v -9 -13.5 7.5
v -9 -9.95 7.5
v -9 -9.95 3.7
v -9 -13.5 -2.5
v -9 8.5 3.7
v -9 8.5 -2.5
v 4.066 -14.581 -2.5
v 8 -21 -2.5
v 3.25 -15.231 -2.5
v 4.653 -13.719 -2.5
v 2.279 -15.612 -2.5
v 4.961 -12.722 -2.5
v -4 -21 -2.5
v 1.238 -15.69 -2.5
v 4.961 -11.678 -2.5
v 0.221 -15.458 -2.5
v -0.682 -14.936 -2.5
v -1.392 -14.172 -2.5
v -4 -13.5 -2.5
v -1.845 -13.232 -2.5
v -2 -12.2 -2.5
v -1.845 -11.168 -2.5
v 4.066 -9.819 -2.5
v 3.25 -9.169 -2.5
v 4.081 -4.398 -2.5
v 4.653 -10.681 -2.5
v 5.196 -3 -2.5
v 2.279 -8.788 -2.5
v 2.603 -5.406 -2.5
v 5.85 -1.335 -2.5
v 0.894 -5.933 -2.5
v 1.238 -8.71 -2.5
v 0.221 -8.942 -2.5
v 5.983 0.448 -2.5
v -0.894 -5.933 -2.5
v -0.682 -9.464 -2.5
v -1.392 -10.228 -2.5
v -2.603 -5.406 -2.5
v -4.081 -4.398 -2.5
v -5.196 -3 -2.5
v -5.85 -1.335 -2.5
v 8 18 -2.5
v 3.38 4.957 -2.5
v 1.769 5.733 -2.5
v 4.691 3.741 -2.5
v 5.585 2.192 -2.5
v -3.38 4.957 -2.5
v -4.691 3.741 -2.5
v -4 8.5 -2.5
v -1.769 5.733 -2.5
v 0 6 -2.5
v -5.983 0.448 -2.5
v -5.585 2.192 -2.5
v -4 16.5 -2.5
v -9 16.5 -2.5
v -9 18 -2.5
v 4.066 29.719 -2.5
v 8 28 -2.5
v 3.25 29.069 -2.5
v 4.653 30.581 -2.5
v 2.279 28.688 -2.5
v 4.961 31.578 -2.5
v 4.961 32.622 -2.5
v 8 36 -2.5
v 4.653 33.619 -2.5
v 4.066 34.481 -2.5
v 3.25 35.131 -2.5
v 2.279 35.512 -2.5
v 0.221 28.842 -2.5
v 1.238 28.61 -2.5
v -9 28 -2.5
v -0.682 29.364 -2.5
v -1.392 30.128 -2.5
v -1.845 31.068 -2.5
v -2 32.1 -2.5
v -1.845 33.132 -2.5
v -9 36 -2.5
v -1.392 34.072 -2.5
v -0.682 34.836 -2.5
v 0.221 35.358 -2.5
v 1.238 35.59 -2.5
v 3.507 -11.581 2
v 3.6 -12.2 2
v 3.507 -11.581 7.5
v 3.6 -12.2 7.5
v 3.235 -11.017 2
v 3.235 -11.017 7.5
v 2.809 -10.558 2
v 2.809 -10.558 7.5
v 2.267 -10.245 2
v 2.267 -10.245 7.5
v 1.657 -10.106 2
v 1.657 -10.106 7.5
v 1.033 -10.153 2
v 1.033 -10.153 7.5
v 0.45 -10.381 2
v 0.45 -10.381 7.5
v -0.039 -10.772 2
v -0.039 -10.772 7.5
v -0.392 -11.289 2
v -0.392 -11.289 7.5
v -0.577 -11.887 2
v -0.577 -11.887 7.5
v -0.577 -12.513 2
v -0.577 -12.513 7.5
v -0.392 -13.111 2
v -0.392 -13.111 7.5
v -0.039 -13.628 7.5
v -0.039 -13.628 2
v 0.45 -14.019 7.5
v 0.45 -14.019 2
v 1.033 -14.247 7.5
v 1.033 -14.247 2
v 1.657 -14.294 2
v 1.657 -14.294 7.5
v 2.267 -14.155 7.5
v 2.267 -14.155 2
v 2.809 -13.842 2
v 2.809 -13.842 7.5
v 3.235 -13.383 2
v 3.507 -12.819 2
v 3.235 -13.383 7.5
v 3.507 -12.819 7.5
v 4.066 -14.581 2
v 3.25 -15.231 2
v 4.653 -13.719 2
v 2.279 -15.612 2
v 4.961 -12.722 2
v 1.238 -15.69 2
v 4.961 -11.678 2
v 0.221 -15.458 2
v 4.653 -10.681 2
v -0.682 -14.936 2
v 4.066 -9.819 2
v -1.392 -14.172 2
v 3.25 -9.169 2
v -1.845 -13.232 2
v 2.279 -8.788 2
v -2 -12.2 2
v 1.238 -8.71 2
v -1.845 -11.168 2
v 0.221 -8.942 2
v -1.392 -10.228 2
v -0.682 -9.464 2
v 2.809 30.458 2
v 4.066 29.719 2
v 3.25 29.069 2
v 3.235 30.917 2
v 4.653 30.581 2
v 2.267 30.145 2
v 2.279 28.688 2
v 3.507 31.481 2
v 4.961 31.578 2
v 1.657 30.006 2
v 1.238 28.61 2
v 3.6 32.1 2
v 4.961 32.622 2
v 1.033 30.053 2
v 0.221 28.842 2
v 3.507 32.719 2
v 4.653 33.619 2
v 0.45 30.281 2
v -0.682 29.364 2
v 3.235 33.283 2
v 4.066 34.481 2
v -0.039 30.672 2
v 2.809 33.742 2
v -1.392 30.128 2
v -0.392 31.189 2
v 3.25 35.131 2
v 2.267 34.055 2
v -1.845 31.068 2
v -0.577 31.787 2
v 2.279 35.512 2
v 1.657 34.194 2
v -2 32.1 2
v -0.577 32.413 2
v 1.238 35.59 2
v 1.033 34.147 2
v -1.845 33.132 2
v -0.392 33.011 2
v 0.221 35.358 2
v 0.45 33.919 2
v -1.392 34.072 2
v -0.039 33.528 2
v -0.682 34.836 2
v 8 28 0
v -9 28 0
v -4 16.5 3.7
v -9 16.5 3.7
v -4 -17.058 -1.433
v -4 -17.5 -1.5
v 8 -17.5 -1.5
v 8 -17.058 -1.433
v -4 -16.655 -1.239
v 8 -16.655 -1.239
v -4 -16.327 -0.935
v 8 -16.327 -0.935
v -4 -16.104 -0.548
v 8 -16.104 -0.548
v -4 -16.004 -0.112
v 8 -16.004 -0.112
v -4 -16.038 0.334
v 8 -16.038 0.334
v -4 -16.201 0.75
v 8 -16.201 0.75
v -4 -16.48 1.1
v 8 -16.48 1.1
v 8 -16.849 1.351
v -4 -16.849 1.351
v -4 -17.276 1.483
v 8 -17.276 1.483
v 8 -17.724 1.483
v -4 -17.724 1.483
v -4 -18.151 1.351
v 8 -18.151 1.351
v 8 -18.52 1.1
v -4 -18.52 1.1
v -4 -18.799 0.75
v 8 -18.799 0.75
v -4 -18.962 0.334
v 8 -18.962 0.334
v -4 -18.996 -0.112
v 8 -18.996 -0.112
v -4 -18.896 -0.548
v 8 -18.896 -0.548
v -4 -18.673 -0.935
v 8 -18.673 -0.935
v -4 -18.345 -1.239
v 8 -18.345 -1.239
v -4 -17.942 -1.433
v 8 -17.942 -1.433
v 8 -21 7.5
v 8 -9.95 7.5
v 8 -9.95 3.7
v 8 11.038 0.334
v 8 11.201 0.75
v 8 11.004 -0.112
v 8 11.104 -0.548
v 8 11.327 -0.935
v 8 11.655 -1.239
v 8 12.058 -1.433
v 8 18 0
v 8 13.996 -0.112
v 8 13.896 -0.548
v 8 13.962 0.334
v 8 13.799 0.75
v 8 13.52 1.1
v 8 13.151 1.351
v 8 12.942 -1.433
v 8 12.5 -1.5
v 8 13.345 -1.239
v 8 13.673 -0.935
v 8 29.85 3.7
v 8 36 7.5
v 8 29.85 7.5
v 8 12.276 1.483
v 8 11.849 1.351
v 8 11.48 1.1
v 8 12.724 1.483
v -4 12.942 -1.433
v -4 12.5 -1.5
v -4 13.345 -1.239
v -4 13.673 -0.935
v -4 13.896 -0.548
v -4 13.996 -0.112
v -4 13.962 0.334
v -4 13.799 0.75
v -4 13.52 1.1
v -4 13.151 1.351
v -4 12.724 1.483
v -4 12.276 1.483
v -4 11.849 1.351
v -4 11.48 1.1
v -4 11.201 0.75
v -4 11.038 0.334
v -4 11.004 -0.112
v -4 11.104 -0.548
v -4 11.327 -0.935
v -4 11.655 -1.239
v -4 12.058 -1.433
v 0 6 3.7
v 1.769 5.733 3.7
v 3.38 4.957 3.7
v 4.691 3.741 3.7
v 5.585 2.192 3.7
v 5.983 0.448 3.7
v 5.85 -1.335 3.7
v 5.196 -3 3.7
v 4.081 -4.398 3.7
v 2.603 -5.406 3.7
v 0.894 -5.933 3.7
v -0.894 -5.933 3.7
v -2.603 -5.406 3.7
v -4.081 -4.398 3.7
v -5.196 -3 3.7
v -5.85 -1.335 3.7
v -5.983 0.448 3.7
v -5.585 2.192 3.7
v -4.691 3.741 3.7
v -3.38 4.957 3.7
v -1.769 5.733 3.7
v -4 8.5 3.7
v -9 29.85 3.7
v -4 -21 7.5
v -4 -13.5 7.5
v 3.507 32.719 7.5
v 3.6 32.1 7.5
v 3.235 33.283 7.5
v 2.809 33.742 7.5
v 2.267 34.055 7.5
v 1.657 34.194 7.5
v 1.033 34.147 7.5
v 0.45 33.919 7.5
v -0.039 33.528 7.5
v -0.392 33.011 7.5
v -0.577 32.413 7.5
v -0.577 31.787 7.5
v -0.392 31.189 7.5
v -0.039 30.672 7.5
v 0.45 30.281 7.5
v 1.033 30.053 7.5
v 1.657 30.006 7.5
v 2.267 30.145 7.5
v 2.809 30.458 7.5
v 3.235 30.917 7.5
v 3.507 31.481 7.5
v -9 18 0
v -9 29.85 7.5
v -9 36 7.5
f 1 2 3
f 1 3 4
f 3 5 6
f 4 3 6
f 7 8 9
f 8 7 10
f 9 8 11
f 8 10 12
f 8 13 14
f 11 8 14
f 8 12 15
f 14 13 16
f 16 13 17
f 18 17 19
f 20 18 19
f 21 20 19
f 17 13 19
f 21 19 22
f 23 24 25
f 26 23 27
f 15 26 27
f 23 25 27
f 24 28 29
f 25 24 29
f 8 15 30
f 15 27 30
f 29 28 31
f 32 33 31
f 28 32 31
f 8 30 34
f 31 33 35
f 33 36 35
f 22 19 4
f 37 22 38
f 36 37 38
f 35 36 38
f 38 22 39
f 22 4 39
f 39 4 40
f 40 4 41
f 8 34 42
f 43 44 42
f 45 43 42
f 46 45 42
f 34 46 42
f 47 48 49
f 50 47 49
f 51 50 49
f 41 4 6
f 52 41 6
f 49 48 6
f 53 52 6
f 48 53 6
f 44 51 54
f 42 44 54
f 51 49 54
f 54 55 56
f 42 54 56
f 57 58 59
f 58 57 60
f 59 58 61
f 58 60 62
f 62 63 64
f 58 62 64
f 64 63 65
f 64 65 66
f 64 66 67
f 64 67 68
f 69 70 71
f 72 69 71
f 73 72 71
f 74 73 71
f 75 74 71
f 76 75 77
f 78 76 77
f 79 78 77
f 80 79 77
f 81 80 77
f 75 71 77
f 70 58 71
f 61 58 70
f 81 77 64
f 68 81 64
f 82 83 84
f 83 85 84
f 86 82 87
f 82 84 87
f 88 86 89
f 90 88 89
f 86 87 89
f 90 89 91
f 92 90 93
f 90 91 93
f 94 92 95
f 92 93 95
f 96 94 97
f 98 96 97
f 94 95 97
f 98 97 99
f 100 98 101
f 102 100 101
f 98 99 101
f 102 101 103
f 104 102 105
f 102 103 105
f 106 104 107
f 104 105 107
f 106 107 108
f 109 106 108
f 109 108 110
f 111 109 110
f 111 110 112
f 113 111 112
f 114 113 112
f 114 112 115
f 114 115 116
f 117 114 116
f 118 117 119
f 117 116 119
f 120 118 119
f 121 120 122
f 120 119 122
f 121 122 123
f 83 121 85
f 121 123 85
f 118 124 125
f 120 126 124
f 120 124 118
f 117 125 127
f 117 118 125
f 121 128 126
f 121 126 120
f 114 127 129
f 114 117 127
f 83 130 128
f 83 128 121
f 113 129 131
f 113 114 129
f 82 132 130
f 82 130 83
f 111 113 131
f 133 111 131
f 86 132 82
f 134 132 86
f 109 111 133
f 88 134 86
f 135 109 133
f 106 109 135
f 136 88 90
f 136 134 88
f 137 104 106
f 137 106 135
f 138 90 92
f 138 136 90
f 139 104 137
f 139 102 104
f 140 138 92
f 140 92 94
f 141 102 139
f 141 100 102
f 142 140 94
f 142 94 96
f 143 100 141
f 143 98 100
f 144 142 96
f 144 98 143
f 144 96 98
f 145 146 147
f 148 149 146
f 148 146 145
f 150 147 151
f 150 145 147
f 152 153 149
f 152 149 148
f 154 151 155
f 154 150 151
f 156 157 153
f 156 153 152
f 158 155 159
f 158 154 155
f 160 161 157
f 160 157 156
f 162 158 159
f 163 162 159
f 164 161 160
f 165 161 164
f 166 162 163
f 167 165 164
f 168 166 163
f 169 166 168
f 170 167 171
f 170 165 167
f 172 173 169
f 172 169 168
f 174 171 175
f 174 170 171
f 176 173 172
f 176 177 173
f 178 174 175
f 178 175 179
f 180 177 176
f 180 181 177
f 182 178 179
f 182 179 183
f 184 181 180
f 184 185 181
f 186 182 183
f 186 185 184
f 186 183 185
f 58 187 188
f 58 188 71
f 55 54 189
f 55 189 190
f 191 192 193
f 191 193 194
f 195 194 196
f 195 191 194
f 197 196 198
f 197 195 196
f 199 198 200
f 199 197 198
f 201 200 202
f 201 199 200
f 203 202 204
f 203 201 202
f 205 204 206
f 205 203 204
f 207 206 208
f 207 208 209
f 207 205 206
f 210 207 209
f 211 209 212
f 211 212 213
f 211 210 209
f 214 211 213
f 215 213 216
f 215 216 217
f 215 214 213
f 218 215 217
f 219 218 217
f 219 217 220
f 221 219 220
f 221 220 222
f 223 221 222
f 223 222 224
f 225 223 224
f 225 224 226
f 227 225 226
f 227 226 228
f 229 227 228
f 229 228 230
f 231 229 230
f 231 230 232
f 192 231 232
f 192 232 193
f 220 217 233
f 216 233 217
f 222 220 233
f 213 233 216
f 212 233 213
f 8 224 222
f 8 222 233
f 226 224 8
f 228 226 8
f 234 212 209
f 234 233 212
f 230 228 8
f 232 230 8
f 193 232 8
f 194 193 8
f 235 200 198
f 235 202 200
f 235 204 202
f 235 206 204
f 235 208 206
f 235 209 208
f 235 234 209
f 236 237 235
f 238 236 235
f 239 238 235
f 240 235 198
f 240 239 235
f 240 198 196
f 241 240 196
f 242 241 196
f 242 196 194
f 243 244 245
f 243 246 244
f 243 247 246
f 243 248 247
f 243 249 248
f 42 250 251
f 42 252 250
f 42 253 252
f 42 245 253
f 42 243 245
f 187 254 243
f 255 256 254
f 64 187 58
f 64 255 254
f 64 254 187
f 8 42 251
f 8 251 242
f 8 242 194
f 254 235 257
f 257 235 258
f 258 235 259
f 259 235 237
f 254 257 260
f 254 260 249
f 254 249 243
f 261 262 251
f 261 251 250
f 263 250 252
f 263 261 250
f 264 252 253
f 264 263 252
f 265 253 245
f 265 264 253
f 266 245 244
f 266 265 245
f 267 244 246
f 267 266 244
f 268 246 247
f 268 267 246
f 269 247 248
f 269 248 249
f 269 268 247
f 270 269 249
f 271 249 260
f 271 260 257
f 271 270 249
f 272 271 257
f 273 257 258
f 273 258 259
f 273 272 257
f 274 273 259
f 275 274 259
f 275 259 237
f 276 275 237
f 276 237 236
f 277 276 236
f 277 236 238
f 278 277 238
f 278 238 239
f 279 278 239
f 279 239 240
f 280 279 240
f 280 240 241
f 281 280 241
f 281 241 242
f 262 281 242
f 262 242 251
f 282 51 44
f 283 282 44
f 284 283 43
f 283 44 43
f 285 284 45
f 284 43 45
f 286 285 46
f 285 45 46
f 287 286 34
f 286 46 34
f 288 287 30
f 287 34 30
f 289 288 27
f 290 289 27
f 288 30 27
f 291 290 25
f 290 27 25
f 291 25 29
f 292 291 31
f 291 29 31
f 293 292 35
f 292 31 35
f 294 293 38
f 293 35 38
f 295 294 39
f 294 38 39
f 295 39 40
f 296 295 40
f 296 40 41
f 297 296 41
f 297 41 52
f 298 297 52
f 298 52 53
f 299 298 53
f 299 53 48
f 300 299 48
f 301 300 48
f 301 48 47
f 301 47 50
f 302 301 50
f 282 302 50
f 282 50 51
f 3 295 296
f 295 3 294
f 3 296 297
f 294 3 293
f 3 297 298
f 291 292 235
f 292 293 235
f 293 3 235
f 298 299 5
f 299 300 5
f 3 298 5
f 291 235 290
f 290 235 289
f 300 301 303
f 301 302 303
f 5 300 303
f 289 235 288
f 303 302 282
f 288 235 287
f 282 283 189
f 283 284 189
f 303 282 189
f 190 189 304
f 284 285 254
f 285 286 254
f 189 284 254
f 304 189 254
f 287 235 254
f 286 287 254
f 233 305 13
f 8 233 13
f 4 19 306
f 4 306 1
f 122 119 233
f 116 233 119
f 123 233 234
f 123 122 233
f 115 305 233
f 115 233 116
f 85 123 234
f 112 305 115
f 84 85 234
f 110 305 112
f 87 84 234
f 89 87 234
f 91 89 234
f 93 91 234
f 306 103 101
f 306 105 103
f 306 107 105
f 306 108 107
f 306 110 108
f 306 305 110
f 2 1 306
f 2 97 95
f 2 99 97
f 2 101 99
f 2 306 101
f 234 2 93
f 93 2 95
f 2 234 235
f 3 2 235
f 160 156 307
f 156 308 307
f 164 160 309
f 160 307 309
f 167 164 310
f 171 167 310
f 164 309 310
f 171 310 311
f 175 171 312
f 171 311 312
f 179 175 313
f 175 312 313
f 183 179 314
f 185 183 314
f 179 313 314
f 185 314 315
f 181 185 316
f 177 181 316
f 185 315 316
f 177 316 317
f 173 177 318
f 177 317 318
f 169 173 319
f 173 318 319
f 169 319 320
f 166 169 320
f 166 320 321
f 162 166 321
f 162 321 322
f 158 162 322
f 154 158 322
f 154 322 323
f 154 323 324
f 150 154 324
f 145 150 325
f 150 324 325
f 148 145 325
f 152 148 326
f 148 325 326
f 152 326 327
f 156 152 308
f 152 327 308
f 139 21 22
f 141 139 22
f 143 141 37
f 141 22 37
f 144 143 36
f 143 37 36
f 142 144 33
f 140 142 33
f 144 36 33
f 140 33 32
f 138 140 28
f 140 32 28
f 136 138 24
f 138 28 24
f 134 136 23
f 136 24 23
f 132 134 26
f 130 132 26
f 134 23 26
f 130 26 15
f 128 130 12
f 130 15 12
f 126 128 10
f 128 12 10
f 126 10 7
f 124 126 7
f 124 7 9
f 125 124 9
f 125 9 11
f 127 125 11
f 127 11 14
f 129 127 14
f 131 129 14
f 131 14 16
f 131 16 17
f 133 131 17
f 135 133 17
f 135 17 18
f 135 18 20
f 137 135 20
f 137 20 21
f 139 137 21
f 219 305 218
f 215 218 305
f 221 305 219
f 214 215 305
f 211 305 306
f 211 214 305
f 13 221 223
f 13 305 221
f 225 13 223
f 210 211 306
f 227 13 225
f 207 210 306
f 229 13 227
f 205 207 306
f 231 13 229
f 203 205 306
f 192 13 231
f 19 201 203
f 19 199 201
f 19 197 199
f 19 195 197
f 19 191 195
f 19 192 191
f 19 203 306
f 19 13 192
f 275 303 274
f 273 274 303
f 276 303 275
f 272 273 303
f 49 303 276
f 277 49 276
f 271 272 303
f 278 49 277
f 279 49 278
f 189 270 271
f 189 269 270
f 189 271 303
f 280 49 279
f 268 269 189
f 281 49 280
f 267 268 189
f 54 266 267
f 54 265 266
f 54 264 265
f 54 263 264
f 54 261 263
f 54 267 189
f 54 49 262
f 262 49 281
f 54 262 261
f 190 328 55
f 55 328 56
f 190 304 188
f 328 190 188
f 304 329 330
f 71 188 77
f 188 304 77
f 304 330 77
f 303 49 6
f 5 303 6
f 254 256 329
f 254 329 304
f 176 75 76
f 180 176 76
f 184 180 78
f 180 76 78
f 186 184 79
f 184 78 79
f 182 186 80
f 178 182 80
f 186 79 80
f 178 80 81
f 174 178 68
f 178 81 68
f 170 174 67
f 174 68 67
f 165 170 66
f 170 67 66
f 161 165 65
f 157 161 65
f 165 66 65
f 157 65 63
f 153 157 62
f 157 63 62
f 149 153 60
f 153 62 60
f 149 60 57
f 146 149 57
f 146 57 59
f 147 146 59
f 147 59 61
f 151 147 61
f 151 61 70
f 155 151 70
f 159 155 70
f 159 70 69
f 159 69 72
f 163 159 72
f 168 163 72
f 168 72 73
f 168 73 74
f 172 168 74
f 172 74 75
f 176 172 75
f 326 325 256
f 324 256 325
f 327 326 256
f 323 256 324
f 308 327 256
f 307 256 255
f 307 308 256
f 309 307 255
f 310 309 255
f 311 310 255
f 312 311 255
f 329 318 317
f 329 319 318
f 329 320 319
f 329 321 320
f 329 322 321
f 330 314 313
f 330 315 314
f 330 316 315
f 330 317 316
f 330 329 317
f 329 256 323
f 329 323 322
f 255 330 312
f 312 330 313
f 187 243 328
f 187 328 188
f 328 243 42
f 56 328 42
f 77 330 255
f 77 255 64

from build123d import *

# Parameters (mm, degrees)
EXTRUSION1_DEPTH                                = 8
EXTRUSION1_DEPTH_BACK                           = 9
ESQUISSE1_W                                     = 10
ESQUISSE1_H                                     = 57
ESQUISSE1_R                                     = 1.5
ESQUISSE2_R                                     = 6
ESQUISSE2_W                                     = 5
ESQUISSE2_H                                     = 8
ESQUISSE2_H_2                                   = 7.5
ENL_V_MAT_EXTRU_1_DEPTH                         = 39.431757701
ESQUISSE3_W                                     = 3.8
ESQUISSE3_H                                     = 39.8
ESQUISSE3_W_2                                   = 2.5
ESQUISSE3_H_2                                   = 10
ENL_V_MAT_EXTRU_2_DEPTH                         = 41.512343798
CHAMBRAGE_POUR_VIS_T_TE_CYLINDRIQUE_D           = 4.2
CHAMBRAGE_POUR_VIS_T_TE_CYLINDRIQUE_CBORE_D     = 7
CHAMBRAGE_POUR_VIS_T_TE_CYLINDRIQUE_CBORE_DEPTH = 4.5


with BuildPart() as part:
    # Esquisse1 → Extrusion1 (new, two sides: drawn at the far end of the back side and taken through both)
    with BuildSketch(Plane(origin=(0, 0, 0), x_dir=(0, 0, -1), z_dir=(1, 0, 0)).offset(-EXTRUSION1_DEPTH_BACK)):
        with Locations((-2.5, 7.5)):
            Rectangle(ESQUISSE1_W, ESQUISSE1_H)
        with Locations((0, 12.5)):
            Circle(ESQUISSE1_R, mode=Mode.SUBTRACT)
        with Locations((0, -17.5)):
            Circle(ESQUISSE1_R, mode=Mode.SUBTRACT)
    extrude(amount=EXTRUSION1_DEPTH + EXTRUSION1_DEPTH_BACK)

    # Esquisse2 → Enlèv. mat.-Extru.1 (cut, through all)
    with BuildSketch(Plane(origin=(0, 0, -2.5), x_dir=(-1, 0, 0), z_dir=(0, 0, -1))):
        with Locations(Location((0, 0, 0), (0, 0, 90))):
            Circle(ESQUISSE2_R)
        with Locations((6.5, 12.5)):
            Rectangle(ESQUISSE2_W, ESQUISSE2_H)
        with Locations((6.5, -17.25)):
            Rectangle(ESQUISSE2_W, ESQUISSE2_H_2)
    extrude(amount=-ENL_V_MAT_EXTRU_1_DEPTH, mode=Mode.SUBTRACT)

    # Esquisse3 → Enlèv. mat.-Extru.2 (cut, through all)
    with BuildSketch(Plane(origin=(8, 0, 0), x_dir=(0, 0, -1), z_dir=(1, 0, 0))):
        with Locations((-5.6, 9.95)):
            Rectangle(ESQUISSE3_W, ESQUISSE3_H)
        with Locations((1.25, 23)):
            Rectangle(ESQUISSE3_W_2, ESQUISSE3_H_2)
    extrude(amount=-ENL_V_MAT_EXTRU_2_DEPTH, mode=Mode.SUBTRACT)

    # Chambrage pour vis à tête cylindrique à 6 pans creux (ou vis CHC) M46 (through all)
    with Locations(Plane(origin=(0, 0, -2.5), x_dir=(-1, 0, 0), z_dir=(0, 0, -1))):
        with Locations((-1.5, -12.2), (-1.5, 32.1)):
            CounterBoreHole(CHAMBRAGE_POUR_VIS_T_TE_CYLINDRIQUE_D / 2, CHAMBRAGE_POUR_VIS_T_TE_CYLINDRIQUE_CBORE_D / 2, CHAMBRAGE_POUR_VIS_T_TE_CYLINDRIQUE_CBORE_DEPTH)


solid = part.part
